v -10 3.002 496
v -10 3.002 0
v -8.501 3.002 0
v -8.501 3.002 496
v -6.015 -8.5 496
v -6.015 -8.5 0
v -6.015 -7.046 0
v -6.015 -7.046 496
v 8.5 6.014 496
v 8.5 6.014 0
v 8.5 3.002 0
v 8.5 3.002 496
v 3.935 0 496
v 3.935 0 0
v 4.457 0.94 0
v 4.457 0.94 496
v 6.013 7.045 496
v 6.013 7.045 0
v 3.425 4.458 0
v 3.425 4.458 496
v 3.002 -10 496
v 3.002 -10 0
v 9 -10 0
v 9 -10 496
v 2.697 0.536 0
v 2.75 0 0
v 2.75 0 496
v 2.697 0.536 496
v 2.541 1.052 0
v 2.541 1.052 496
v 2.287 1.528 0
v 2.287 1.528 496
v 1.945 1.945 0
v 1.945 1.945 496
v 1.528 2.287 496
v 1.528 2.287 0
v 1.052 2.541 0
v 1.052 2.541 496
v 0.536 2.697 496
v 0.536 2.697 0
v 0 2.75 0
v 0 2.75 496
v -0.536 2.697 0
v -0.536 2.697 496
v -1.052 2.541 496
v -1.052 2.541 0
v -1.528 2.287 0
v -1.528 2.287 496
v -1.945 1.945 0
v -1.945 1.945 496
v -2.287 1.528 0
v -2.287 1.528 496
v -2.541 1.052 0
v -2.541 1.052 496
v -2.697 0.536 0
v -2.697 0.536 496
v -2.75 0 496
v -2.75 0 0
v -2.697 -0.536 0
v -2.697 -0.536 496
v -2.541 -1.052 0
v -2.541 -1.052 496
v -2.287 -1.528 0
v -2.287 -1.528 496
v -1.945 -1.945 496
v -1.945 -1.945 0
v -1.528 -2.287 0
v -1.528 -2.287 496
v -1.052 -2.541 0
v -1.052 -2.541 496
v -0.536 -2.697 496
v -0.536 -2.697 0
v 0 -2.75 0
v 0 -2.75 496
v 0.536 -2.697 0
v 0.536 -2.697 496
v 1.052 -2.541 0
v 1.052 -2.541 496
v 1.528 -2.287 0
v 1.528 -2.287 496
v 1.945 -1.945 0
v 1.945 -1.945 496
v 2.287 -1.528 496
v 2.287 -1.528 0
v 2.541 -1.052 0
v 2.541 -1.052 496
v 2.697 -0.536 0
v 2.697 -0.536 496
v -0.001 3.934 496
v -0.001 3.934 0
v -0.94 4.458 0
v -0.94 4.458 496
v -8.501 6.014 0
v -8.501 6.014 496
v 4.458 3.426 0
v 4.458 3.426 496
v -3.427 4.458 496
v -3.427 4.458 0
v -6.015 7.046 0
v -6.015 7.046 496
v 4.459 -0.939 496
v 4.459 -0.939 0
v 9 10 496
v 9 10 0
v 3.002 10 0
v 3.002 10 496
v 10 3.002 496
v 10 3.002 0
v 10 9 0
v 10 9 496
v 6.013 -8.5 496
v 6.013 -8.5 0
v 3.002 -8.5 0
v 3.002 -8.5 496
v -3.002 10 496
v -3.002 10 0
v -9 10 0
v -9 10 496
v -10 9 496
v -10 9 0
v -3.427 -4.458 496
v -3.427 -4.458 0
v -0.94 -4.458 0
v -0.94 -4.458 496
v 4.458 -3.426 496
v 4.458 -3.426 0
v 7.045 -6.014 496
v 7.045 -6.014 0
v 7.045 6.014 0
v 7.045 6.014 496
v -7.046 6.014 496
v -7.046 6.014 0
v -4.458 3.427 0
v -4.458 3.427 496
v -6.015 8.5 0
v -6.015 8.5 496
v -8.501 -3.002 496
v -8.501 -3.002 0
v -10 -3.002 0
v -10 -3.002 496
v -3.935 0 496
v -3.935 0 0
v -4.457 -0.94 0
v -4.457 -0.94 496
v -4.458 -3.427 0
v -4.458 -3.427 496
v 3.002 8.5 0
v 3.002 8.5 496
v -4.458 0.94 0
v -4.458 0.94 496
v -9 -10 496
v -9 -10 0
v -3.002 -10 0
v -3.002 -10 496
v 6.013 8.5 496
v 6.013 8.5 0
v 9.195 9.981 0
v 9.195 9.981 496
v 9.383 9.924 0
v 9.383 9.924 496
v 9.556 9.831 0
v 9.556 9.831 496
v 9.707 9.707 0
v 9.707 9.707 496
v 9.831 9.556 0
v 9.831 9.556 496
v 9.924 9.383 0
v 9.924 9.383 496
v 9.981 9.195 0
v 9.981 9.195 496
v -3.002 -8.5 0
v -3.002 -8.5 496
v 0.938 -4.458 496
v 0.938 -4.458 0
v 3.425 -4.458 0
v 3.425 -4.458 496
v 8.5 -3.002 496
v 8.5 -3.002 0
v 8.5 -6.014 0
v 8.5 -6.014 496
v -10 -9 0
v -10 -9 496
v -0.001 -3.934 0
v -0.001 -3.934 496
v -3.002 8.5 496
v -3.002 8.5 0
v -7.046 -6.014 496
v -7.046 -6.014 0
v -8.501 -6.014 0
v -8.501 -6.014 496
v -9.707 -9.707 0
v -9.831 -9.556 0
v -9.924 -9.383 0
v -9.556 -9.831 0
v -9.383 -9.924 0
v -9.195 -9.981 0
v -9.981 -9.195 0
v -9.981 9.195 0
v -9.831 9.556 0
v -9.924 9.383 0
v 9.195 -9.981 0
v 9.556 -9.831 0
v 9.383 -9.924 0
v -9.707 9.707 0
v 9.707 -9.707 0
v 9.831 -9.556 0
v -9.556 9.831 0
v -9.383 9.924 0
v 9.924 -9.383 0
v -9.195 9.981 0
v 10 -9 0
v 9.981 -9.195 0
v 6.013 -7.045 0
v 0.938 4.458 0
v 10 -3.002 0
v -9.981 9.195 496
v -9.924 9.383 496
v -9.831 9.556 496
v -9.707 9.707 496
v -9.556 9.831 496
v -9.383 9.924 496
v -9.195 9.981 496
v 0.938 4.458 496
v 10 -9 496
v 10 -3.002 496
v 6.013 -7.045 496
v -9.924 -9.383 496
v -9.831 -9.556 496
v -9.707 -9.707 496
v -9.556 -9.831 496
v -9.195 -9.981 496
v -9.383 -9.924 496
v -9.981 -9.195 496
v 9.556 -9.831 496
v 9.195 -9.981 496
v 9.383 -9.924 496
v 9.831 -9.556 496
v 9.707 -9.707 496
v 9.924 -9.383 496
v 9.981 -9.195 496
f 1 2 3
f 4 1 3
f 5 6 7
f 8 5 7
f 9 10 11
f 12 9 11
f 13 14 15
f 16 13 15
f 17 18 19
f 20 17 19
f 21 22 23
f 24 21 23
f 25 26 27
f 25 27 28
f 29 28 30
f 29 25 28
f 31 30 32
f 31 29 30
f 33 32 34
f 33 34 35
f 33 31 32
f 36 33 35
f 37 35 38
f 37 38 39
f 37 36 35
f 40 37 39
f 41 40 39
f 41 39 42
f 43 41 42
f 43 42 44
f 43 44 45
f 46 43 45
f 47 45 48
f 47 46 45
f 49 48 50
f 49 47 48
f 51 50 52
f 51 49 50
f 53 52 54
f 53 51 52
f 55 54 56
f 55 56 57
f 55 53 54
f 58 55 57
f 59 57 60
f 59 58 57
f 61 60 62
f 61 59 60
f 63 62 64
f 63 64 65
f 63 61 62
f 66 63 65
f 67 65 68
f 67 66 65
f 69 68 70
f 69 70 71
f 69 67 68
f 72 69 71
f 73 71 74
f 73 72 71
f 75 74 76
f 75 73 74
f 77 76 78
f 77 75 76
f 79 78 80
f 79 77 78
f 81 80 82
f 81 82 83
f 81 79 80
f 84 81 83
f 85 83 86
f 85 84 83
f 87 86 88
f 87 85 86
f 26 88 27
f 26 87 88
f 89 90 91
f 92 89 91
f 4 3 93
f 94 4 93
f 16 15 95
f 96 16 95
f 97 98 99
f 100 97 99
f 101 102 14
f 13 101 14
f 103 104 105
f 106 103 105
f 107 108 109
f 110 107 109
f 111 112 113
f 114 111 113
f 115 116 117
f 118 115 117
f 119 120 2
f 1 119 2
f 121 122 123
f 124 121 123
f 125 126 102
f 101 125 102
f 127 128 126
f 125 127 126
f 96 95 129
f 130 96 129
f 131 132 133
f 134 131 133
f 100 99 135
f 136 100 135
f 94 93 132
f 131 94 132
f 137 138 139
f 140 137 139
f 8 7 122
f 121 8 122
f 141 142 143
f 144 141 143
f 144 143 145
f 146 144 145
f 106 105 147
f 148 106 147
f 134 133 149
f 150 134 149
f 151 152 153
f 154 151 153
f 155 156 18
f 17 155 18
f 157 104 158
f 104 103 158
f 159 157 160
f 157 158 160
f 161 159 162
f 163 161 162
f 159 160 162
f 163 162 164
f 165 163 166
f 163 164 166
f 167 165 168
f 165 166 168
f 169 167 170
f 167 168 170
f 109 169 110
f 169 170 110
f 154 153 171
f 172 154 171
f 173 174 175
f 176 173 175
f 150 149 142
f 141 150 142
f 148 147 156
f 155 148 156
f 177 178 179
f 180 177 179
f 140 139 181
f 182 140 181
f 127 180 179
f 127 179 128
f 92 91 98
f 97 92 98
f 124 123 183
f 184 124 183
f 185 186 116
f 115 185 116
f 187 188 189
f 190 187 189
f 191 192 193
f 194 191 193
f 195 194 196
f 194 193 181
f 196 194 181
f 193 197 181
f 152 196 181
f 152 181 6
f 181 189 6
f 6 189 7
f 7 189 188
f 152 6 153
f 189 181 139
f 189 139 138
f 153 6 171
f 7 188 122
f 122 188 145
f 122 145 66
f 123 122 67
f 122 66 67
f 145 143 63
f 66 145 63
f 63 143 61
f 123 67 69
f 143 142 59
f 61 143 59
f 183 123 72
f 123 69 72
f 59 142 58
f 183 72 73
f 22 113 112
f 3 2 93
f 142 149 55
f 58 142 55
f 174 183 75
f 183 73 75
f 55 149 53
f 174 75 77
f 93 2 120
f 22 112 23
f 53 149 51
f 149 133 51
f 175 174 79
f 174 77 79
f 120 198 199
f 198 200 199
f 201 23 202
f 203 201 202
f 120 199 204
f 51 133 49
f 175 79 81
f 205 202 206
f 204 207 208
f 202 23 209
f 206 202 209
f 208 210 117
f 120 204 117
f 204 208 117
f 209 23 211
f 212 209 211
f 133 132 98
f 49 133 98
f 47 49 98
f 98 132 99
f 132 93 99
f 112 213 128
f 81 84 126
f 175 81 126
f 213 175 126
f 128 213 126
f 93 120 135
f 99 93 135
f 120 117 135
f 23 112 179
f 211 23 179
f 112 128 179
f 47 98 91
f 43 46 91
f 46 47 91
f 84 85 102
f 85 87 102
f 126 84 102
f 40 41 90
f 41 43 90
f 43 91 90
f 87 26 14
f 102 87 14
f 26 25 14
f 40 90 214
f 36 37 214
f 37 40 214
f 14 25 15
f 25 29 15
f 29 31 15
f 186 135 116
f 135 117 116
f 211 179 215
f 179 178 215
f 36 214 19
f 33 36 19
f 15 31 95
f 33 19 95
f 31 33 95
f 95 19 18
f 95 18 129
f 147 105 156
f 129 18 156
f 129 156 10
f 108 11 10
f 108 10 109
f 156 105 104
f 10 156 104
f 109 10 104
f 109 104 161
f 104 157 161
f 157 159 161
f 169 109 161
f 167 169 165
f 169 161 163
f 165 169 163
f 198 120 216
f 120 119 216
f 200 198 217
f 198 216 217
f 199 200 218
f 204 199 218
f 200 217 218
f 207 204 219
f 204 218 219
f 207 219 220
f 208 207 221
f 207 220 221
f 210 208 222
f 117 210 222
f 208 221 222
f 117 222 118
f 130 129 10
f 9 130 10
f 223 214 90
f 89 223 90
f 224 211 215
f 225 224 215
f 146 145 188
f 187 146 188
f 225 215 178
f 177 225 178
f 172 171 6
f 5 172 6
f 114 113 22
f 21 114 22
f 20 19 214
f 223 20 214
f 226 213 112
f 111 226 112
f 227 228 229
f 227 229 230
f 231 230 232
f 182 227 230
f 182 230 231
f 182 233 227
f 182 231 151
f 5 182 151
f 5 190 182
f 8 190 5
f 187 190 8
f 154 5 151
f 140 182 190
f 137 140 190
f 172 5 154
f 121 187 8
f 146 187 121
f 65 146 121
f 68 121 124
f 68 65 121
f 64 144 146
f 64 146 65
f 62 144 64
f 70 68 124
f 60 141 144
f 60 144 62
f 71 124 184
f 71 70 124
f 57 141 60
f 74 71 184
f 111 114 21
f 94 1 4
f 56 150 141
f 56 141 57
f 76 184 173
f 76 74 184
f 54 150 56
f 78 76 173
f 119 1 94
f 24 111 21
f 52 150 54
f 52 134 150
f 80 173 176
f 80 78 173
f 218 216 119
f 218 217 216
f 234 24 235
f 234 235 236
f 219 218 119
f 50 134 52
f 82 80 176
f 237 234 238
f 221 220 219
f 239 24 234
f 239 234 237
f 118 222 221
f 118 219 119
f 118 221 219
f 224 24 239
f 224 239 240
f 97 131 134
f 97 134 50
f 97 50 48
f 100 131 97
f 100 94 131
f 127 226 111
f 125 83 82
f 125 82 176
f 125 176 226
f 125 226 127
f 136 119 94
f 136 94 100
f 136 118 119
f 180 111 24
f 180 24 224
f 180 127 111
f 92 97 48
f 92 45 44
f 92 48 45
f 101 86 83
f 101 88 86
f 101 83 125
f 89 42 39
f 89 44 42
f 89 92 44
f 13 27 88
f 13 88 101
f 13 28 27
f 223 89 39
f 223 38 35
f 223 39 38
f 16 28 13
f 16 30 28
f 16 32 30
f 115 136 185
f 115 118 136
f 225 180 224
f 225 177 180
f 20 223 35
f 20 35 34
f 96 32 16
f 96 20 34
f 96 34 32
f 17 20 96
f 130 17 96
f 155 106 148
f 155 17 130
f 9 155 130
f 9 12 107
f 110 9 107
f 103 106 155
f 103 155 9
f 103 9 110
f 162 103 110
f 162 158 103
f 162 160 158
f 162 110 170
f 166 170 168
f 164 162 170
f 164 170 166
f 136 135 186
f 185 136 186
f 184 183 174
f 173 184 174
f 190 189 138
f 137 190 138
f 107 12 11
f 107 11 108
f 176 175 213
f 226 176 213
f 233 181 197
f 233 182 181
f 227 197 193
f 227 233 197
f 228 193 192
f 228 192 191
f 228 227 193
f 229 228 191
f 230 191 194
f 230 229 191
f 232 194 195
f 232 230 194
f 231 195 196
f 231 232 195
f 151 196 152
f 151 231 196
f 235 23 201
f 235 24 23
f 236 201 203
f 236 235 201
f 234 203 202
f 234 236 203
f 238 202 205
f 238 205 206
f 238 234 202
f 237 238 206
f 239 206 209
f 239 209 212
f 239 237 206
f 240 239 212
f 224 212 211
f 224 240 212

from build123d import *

# Parameters (mm, degrees)
SKETCH1_R           = 2.75
BOSS_EXTRUDE1_DEPTH = 496
FILLET2_R           = 1
FILLET3_R           = 1
FILLET4_R           = 1
FILLET5_R           = 1


with BuildPart() as part:
    # Sketch1 → Boss-Extrude1 (new body)
    with BuildSketch(Plane.XY):
        Polygon((-3.001792446, 10), (-10, 10), (-10, 3.001792446), (-8.500771543, 3.001792446), (-8.500771543, 6.014407427), (-7.045753692, 6.014407427), (-4.458187435, 3.426841169), (-4.458187435, 0.939646666), (-3.934715846, 0), (-4.45749106, -0.939646666), (-4.458187435, -3.426841169), (-7.045753692, -6.014407427), (-8.500771543, -6.014407427), (-8.500771543, -3.001792446), (-10, -3.001792446), (-10, -10), (-3.001792446, -10), (-3.001792446, -8.499999951), (-6.014791508, -8.499999951), (-6.014791508, -7.045753643), (-3.427225251, -4.458187385), (-0.939604714, -4.458187385), (-0.00108721, -3.933944043), (0.937618184, -4.457850876), (3.425238721, -4.457850876), (6.012804978, -7.045417133), (6.012804978, -8.499999951), (3.001792545, -8.499999951), (3.001792545, -10), (10.000000099, -10), (10.000000099, -3.001792446), (8.500000007, -3.001792446), (8.500000007, -6.014262022), (7.045447383, -6.014262022), (4.458345013, -3.426231961), (4.458790942, -0.938611464), (3.934715846, 0), (4.45749106, 0.939646666), (4.458344956, 3.426231961), (7.045447327, 6.014262022), (8.500000148, 6.014262022), (8.500000148, 3.001792446), (10.000000198, 3.001792446), (10.000000198, 10), (3.001792643, 10), (3.001792643, 8.499999951), (6.012804978, 8.499999951), (6.012804978, 7.045417133), (3.425238721, 4.457850876), (0.937618184, 4.457850876), (-0.00108721, 3.933944043), (-0.939604714, 4.458187385), (-3.427225251, 4.458187385), (-6.014791508, 7.045753643), (-6.014791508, 8.499999951), (-3.001792446, 8.499999951), align=None)
        Circle(SKETCH1_R, mode=Mode.SUBTRACT)
    extrude(amount=BOSS_EXTRUDE1_DEPTH)

    # Fillet2
    fillet2_edges = [part.edges().sort_by_distance(p)[0] for p in [
        (-10, -10, 248),
    ]]
    fillet(fillet2_edges, radius=FILLET2_R)

    # Fillet3
    fillet3_edges = [part.edges().sort_by_distance(p)[0] for p in [
        (10.000000099, -10, 248),
    ]]
    fillet(fillet3_edges, radius=FILLET3_R)

    # Fillet4
    fillet4_edges = [part.edges().sort_by_distance(p)[0] for p in [
        (-10, 10, 248),
    ]]
    fillet(fillet4_edges, radius=FILLET4_R)

    # Fillet5
    fillet5_edges = [part.edges().sort_by_distance(p)[0] for p in [
        (10.000000198, 10, 248),
    ]]
    fillet(fillet5_edges, radius=FILLET5_R)


solid = part.part
